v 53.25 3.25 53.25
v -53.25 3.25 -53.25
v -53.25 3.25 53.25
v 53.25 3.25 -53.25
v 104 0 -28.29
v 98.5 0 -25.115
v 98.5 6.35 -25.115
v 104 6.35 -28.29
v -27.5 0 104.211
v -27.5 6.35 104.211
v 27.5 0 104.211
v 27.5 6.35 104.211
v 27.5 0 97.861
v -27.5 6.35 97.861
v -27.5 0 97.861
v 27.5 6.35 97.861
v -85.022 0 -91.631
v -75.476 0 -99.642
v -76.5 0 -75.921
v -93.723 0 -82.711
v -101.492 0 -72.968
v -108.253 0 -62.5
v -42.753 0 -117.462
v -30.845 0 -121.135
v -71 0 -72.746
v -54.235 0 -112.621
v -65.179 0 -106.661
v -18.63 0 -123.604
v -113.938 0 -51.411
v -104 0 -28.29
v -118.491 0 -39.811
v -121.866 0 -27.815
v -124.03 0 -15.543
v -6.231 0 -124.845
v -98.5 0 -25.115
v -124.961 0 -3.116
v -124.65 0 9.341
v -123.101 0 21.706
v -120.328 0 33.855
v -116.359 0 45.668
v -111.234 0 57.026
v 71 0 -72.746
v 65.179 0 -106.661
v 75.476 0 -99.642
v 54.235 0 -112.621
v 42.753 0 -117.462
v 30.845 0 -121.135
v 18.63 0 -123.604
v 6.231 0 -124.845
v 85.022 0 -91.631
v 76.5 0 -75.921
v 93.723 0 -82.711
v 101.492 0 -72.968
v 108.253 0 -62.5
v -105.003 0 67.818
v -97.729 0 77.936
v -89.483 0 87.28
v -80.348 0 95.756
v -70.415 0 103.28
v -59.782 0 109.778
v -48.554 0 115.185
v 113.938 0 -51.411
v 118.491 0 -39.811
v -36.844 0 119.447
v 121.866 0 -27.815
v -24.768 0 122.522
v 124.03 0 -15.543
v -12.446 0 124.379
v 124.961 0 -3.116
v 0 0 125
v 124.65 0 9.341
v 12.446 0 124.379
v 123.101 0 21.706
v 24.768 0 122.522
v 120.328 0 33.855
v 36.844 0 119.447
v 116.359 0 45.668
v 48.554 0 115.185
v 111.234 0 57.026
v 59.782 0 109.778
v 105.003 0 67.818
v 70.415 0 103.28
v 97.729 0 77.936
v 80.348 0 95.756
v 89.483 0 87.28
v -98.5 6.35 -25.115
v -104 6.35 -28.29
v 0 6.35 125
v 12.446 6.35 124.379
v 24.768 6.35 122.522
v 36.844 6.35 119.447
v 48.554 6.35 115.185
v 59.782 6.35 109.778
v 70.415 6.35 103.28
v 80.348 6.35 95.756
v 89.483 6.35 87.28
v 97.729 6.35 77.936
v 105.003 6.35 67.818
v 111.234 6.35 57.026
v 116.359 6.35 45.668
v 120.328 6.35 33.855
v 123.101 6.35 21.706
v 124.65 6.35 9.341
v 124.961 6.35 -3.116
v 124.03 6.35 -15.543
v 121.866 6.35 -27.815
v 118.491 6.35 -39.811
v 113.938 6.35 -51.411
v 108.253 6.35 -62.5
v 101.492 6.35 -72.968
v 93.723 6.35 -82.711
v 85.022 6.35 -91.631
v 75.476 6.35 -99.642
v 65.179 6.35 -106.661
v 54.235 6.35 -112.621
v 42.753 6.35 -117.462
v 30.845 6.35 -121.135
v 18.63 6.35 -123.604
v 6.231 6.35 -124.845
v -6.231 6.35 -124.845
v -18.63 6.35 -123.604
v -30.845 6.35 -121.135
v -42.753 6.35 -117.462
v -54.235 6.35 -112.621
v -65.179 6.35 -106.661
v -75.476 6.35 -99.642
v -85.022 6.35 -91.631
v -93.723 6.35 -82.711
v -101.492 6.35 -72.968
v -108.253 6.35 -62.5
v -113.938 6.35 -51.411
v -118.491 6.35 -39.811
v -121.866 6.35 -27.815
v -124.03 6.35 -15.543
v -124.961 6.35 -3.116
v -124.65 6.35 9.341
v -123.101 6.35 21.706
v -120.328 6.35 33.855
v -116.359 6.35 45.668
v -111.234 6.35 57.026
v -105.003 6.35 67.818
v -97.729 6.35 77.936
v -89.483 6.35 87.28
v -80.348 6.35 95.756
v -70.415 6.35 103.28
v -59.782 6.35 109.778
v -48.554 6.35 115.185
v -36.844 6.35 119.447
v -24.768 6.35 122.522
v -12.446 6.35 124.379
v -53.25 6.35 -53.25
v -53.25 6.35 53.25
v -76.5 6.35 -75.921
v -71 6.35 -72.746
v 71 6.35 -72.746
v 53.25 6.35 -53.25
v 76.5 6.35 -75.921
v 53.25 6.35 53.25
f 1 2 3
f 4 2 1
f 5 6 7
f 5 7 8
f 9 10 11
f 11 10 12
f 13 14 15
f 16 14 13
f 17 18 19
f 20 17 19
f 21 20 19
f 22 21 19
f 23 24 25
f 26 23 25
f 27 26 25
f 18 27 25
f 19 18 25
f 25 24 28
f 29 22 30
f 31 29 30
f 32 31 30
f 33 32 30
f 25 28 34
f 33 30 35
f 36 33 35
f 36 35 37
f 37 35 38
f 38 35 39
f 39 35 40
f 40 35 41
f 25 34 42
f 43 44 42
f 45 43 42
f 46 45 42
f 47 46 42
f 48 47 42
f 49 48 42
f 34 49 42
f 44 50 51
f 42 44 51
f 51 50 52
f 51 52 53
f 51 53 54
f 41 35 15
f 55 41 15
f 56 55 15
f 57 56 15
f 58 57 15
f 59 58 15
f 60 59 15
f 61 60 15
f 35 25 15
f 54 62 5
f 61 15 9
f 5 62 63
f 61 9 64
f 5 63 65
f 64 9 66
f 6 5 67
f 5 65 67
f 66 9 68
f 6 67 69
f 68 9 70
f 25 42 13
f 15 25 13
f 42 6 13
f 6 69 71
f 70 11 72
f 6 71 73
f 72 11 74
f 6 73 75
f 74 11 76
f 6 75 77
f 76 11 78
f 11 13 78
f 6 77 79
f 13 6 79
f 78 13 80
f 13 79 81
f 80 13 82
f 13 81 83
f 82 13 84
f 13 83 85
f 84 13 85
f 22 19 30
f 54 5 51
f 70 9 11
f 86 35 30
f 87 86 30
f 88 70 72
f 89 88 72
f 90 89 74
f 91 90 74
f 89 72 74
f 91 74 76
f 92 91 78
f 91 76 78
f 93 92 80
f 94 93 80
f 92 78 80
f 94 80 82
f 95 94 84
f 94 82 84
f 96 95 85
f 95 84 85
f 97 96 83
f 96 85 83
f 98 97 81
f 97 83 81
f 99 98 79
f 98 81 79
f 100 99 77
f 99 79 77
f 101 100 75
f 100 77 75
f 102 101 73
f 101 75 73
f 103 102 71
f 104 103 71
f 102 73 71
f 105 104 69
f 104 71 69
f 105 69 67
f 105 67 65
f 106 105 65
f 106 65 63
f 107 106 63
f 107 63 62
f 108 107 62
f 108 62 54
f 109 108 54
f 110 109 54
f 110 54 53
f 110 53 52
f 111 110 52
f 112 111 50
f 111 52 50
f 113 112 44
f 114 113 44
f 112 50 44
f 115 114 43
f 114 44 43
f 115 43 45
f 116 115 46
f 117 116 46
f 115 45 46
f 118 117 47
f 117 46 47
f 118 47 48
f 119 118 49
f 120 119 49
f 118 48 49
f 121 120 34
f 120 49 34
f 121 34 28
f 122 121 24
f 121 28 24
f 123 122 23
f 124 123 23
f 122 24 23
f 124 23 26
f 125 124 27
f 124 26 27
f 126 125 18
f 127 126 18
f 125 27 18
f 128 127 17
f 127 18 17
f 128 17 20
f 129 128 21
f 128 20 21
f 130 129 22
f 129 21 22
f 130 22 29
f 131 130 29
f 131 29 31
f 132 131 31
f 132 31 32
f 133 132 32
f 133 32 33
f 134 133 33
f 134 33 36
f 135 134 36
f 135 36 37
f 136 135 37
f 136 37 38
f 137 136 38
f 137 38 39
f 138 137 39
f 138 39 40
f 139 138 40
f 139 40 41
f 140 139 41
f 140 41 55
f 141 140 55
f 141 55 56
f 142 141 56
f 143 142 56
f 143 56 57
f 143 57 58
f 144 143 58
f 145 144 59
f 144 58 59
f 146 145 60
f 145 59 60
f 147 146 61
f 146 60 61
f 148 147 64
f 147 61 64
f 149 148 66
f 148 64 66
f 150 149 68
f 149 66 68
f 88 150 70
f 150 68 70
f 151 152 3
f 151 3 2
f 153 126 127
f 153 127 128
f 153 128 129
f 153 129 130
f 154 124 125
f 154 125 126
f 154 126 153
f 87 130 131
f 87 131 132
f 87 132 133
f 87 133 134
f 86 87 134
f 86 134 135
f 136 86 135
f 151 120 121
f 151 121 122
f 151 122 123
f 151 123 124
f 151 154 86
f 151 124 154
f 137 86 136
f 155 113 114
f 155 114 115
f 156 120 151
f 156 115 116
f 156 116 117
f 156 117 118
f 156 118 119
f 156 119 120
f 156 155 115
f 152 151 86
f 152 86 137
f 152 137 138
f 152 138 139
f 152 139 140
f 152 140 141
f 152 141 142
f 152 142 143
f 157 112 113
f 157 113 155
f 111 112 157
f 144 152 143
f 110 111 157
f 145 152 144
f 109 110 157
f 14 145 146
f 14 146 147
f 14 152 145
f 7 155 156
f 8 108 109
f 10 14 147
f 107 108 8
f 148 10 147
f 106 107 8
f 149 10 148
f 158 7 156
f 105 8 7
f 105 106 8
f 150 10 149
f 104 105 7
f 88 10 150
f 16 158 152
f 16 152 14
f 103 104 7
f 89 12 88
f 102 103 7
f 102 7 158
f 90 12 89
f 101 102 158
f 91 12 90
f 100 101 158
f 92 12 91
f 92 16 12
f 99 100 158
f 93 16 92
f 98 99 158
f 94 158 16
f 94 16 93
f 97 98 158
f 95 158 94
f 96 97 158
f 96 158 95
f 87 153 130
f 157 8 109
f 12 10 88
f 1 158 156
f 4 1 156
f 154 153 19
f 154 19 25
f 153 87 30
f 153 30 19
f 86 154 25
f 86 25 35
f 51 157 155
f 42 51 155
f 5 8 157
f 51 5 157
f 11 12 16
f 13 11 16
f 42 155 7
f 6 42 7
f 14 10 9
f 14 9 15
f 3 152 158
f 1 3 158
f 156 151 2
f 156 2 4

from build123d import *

# Parameters (mm, degrees)
SKETCH1_R           = 125
BOSS_EXTRUDE1_DEPTH = 6.35
SKETCH3_W           = 55
SKETCH3_H           = 6.35
CUT_EXTRUDE1_DEPTH  = 177.890707783
SKETCH4_W           = 106.5
SKETCH4_H           = 106.5
CUT_EXTRUDE2_DEPTH  = 3.1


with BuildPart() as part:
    # Sketch1 → Boss-Extrude1 (new body)
    with BuildSketch(Plane(origin=(0, 0, 0), x_dir=(1, 0, 0), z_dir=(0, 1, 0))):
        Circle(SKETCH1_R)
    extrude(amount=BOSS_EXTRUDE1_DEPTH)

    # Sketch3 → Cut-Extrude1 (cut, through all)
    with BuildSketch(Plane(origin=(0, 6.35, 0), x_dir=(1, 0, 0), z_dir=(0, 1, 0))):
        Polygon((-98.500369343, 25.11494995), (-103.999630657, 28.28994995), (-76.499630657, 75.921347158), (-71.000369343, 72.746347158), align=None)
        Polygon((71.000369343, 72.746347158), (98.500369343, 25.11494995), (103.999630657, 28.28994995), (76.499630657, 75.921347158), align=None)
        with Locations((0, -101.036297108)):
            Rectangle(SKETCH3_W, SKETCH3_H)
    extrude(amount=-CUT_EXTRUDE1_DEPTH, mode=Mode.SUBTRACT)

    # Sketch4 → Cut-Extrude2 (cut)
    with BuildSketch(Plane(origin=(0, 6.35, 0), x_dir=(1, 0, 0), z_dir=(0, 1, 0))):
        Rectangle(SKETCH4_W, SKETCH4_H)
    extrude(amount=-CUT_EXTRUDE2_DEPTH, mode=Mode.SUBTRACT)


solid = part.part
